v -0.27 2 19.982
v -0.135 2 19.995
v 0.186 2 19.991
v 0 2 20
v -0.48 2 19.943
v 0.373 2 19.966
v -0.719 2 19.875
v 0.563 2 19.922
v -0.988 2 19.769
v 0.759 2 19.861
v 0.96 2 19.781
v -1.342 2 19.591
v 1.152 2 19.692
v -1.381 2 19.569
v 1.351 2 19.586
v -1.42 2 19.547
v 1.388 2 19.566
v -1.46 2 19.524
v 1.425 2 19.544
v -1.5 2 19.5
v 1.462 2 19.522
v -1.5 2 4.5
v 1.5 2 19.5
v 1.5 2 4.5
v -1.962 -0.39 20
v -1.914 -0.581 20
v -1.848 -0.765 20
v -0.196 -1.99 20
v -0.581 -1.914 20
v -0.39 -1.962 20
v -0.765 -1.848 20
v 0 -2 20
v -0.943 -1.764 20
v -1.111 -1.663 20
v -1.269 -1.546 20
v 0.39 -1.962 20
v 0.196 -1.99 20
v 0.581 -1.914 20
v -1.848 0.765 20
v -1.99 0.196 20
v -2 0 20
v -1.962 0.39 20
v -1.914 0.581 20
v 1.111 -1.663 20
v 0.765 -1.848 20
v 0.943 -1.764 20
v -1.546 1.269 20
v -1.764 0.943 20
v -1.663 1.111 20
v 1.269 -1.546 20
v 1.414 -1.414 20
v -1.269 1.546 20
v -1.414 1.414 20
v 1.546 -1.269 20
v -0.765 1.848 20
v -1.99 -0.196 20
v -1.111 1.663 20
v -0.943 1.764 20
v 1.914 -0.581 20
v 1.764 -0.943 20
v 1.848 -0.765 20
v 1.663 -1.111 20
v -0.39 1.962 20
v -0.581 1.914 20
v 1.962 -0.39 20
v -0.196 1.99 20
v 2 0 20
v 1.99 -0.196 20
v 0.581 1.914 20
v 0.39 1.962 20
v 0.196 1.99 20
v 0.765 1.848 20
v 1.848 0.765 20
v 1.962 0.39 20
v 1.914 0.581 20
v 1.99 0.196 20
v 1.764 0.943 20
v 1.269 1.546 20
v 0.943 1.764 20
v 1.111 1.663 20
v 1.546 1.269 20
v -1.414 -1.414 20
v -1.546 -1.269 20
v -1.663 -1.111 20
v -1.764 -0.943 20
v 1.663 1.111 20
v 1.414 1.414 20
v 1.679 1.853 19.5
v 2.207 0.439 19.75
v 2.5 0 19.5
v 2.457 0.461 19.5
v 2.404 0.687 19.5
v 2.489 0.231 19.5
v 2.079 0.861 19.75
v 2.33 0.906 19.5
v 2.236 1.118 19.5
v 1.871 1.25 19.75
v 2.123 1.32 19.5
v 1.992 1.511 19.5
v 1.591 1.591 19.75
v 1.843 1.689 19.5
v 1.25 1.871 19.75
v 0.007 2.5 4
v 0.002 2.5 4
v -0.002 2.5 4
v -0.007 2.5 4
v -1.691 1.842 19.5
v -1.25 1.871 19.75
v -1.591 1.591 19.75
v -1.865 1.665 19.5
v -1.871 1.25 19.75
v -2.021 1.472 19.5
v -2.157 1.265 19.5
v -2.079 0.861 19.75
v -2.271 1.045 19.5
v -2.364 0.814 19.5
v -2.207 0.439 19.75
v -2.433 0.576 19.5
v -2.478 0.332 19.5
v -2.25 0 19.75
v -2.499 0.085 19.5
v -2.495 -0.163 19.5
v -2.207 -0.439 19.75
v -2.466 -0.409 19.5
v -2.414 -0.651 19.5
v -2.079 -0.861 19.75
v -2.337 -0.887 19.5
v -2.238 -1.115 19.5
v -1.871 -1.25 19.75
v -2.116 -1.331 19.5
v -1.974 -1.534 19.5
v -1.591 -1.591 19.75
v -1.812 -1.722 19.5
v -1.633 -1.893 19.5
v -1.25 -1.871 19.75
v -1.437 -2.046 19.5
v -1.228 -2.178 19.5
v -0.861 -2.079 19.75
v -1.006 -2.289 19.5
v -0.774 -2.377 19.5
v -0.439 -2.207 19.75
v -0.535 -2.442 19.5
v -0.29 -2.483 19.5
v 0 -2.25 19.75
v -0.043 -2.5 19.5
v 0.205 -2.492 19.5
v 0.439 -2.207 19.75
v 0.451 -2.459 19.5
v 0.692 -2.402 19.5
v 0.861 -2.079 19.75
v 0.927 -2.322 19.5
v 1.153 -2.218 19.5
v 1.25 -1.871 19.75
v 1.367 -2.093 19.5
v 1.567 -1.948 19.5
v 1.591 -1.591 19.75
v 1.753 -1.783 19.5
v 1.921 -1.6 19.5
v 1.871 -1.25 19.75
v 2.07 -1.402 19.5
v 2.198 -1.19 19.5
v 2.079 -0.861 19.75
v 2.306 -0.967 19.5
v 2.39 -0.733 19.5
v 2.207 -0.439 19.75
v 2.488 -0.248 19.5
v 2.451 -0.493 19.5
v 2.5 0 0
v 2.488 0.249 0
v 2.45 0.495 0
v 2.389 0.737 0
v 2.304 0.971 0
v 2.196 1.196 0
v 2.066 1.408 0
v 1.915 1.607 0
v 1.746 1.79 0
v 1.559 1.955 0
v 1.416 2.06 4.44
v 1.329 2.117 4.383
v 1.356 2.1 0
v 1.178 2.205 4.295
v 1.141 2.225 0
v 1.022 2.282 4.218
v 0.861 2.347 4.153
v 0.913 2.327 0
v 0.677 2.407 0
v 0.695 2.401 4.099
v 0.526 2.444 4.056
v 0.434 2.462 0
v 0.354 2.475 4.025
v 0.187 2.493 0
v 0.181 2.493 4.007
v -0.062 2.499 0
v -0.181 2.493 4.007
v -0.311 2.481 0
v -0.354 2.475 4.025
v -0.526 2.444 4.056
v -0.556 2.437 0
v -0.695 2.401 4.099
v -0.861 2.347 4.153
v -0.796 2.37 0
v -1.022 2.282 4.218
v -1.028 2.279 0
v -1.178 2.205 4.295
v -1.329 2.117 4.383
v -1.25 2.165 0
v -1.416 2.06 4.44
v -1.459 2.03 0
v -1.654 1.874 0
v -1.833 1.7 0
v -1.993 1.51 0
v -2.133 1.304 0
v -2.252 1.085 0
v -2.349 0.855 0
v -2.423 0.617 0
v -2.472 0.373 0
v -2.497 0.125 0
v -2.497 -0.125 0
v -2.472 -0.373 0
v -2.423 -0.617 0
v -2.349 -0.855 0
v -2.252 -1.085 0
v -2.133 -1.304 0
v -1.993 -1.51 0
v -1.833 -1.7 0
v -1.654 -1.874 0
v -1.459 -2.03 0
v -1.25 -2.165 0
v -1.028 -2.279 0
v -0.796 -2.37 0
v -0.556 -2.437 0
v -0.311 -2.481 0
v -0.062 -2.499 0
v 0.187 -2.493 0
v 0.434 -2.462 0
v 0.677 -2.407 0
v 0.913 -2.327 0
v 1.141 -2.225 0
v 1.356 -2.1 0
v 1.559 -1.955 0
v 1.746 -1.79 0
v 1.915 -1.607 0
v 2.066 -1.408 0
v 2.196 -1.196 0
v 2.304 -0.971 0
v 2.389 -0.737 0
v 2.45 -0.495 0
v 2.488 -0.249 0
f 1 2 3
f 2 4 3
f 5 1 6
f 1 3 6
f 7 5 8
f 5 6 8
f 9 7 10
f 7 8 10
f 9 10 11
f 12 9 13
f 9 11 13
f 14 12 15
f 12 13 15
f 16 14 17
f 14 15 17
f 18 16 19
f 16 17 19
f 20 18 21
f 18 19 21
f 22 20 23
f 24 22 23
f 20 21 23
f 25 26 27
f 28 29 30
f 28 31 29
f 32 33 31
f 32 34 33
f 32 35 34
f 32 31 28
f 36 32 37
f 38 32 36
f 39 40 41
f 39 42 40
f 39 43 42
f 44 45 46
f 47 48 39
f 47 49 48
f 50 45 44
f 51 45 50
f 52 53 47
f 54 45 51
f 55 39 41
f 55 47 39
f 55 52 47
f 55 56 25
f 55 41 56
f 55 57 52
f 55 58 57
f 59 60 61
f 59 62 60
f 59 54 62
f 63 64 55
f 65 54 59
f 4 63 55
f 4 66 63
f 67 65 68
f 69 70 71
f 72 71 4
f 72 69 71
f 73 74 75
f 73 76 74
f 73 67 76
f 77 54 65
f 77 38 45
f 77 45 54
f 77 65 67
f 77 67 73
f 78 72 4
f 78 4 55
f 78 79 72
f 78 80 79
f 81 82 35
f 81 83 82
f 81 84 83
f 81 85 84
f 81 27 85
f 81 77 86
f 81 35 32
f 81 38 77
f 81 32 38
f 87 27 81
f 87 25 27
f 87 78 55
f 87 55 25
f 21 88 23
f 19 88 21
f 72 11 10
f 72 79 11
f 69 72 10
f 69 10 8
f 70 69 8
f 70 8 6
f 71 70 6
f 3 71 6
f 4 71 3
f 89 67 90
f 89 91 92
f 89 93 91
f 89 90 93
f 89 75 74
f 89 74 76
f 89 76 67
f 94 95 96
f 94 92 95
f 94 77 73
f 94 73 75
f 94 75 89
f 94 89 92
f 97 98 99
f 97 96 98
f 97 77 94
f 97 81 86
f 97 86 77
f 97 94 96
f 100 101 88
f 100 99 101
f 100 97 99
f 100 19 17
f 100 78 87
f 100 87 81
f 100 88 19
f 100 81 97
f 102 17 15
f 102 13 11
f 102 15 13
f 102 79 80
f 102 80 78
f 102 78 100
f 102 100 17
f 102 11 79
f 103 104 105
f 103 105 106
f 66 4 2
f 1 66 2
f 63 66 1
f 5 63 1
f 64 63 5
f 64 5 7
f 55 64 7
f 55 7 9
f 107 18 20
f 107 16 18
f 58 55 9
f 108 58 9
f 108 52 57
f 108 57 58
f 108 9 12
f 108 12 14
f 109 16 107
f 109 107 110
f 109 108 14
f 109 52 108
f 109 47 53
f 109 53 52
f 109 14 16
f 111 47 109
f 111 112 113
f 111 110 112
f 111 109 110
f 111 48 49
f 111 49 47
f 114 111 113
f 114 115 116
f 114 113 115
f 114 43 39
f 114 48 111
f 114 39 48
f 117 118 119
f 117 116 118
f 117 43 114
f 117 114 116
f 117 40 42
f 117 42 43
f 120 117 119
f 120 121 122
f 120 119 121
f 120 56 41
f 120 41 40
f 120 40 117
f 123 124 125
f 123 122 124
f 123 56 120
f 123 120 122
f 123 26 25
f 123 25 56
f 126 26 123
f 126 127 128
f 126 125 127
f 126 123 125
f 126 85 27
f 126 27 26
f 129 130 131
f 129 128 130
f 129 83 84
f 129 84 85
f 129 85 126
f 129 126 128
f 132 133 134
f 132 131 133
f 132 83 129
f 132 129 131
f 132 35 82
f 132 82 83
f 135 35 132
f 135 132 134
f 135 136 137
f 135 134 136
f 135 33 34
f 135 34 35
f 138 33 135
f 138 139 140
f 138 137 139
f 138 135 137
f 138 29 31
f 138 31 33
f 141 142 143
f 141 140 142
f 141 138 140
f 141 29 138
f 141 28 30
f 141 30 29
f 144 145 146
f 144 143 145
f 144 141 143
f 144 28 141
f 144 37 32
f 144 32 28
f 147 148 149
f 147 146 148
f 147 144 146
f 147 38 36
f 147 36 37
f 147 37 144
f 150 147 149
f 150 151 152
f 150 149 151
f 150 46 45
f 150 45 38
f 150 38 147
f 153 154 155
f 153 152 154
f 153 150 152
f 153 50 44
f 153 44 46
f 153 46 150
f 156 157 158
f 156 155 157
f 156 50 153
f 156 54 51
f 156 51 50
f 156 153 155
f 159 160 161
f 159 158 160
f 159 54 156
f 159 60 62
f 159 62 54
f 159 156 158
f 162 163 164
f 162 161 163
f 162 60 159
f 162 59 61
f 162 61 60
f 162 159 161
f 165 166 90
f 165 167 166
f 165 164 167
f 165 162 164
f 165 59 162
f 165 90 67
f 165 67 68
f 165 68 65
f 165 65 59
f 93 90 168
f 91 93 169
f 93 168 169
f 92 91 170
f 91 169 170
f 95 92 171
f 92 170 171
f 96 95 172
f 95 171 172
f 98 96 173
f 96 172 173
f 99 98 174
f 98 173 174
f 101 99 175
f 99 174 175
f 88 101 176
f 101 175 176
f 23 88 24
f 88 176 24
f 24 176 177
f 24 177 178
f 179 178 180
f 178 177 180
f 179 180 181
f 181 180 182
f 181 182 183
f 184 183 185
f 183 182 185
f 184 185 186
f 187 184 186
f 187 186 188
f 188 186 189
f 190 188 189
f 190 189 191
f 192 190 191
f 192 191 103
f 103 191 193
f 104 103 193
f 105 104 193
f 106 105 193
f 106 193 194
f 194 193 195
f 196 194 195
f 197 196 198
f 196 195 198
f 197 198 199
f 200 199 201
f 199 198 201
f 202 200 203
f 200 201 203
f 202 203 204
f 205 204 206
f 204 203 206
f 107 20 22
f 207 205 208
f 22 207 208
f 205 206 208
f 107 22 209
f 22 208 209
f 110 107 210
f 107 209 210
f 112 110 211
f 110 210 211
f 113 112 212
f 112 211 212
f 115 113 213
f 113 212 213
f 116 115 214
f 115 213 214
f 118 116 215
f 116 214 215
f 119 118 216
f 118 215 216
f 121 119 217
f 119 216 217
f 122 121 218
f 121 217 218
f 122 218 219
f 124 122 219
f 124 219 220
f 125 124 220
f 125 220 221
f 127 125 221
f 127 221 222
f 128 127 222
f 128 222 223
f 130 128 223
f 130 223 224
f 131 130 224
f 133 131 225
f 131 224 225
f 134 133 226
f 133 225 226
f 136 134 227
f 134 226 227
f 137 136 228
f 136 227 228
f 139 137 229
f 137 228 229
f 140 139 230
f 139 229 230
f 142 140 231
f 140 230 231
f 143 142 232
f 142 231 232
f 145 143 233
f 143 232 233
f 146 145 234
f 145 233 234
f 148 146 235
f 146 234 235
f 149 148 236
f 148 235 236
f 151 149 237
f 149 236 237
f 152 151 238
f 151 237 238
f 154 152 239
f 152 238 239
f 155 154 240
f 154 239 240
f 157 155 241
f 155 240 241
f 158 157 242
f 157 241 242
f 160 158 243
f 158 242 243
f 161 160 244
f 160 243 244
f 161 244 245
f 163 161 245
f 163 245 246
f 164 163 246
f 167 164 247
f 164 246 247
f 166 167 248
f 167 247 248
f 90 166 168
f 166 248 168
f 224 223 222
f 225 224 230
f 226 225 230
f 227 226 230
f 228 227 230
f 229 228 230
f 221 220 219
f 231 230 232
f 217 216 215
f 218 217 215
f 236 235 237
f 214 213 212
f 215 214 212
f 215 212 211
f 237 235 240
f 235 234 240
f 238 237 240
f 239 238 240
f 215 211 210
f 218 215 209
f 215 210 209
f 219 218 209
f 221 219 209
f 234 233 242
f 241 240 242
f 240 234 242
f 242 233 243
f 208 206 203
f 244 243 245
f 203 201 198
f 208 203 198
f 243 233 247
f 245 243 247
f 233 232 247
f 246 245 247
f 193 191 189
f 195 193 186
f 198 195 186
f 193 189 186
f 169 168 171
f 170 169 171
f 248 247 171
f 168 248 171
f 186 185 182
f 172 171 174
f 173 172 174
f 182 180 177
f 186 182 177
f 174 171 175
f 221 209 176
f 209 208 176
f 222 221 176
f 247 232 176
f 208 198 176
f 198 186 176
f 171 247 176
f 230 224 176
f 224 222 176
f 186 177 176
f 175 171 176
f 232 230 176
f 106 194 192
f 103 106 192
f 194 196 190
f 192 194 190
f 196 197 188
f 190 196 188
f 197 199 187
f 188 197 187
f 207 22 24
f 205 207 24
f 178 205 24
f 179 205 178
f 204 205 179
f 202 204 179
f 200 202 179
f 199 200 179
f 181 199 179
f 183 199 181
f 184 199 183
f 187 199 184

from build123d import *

# Parameters (mm, degrees)
F0_R        = 2.5
F1_DEPTH    = 20
F3_DEPTH    = 16
F4_T2_ANGLE = 304.0474034012
F4_T4_ANGLE = 123.8663608487
F5_SIZE     = 0.49999


# Not quite as in the source:
# - a fillet or chamfer that OpenCascade refuses, or shapes differently, is made with other operations: its cross-section is extruded or revolved along the edge and cut away or added
# - a fillet or chamfer is up to 0.001 mm smaller than in the source, because OpenCascade refuses the exact size


with BuildPart() as f1:
    # F0 (on Top) → F1 (new body)
    with BuildSketch(Plane.XY):
        Circle(F0_R)
    extrude(amount=F1_DEPTH)

    # F2 (on face) → F3 (cut)
    with BuildSketch(Plane.XY.offset(20)):
        with BuildLine():
            ThreePointArc((1.5, 2), (0, 2.5), (-1.5, 2))
            Line((-1.5, 2), (1.5, 2))
        make_face()
    extrude(amount=-F3_DEPTH, mode=Mode.SUBTRACT)

    # F4: chamfer of 0.5 on 1 edges, made by hand

    # F4_s1 → F4_t2 (revolve, cut)
    with BuildSketch(Plane(origin=(0, 0, 0), x_dir=(0, 0, 1), z_dir=(0.8285746432, -0.5598786125, 0))):
        with BuildLine():
            Line((19.4858578644, -2.5141421356), (20.0141421356, -1.9858578644))
            Line((20.0141421356, -1.9858578644), (20.0241421356, -1.9858578644))
            ThreePointArc((20.0241421356, -1.9858578644), (20.01, -2.2429289322), (20.01, -2.5))
            Line((20.01, -2.5), (20, -2.51))
            ThreePointArc((20, -2.51), (19.7429289322, -2.51), (19.4858578644, -2.5241421356))
            Line((19.4858578644, -2.5241421356), (19.4858578644, -2.5141421356))
        make_face()
    revolve(axis=Axis((0, 0, 20), (0, 0, 1)), revolution_arc=F4_T2_ANGLE, mode=Mode.SUBTRACT)

    # F4_s3 → F4_t4 (revolve, cut)
    with BuildSketch(Plane.XZ):
        with BuildLine():
            Line((2.5141421356, 19.4858578644), (1.9858578644, 20.0141421356))
            Line((1.9858578644, 20.0141421356), (1.9858578644, 20.0241421356))
            ThreePointArc((1.9858578644, 20.0241421356), (2.2429289322, 20.01), (2.5, 20.01))
            Line((2.5, 20.01), (2.51, 20))
            ThreePointArc((2.51, 20), (2.51, 19.7429289322), (2.5241421356, 19.4858578644))
            Line((2.5241421356, 19.4858578644), (2.5141421356, 19.4858578644))
        make_face()
    revolve(axis=Axis((0, 0, 20), (0, 0, 1)), revolution_arc=F4_T4_ANGLE, mode=Mode.SUBTRACT)

    # F5 (size 0.5 in the source; OpenCascade refuses exactly that, so slightly less here)
    f5_edges = [f1.edges().sort_by_distance(p)[0] for p in [
        (0, 2, 4),
    ]]
    chamfer(f5_edges, length=F5_SIZE)


solid = f1.part
